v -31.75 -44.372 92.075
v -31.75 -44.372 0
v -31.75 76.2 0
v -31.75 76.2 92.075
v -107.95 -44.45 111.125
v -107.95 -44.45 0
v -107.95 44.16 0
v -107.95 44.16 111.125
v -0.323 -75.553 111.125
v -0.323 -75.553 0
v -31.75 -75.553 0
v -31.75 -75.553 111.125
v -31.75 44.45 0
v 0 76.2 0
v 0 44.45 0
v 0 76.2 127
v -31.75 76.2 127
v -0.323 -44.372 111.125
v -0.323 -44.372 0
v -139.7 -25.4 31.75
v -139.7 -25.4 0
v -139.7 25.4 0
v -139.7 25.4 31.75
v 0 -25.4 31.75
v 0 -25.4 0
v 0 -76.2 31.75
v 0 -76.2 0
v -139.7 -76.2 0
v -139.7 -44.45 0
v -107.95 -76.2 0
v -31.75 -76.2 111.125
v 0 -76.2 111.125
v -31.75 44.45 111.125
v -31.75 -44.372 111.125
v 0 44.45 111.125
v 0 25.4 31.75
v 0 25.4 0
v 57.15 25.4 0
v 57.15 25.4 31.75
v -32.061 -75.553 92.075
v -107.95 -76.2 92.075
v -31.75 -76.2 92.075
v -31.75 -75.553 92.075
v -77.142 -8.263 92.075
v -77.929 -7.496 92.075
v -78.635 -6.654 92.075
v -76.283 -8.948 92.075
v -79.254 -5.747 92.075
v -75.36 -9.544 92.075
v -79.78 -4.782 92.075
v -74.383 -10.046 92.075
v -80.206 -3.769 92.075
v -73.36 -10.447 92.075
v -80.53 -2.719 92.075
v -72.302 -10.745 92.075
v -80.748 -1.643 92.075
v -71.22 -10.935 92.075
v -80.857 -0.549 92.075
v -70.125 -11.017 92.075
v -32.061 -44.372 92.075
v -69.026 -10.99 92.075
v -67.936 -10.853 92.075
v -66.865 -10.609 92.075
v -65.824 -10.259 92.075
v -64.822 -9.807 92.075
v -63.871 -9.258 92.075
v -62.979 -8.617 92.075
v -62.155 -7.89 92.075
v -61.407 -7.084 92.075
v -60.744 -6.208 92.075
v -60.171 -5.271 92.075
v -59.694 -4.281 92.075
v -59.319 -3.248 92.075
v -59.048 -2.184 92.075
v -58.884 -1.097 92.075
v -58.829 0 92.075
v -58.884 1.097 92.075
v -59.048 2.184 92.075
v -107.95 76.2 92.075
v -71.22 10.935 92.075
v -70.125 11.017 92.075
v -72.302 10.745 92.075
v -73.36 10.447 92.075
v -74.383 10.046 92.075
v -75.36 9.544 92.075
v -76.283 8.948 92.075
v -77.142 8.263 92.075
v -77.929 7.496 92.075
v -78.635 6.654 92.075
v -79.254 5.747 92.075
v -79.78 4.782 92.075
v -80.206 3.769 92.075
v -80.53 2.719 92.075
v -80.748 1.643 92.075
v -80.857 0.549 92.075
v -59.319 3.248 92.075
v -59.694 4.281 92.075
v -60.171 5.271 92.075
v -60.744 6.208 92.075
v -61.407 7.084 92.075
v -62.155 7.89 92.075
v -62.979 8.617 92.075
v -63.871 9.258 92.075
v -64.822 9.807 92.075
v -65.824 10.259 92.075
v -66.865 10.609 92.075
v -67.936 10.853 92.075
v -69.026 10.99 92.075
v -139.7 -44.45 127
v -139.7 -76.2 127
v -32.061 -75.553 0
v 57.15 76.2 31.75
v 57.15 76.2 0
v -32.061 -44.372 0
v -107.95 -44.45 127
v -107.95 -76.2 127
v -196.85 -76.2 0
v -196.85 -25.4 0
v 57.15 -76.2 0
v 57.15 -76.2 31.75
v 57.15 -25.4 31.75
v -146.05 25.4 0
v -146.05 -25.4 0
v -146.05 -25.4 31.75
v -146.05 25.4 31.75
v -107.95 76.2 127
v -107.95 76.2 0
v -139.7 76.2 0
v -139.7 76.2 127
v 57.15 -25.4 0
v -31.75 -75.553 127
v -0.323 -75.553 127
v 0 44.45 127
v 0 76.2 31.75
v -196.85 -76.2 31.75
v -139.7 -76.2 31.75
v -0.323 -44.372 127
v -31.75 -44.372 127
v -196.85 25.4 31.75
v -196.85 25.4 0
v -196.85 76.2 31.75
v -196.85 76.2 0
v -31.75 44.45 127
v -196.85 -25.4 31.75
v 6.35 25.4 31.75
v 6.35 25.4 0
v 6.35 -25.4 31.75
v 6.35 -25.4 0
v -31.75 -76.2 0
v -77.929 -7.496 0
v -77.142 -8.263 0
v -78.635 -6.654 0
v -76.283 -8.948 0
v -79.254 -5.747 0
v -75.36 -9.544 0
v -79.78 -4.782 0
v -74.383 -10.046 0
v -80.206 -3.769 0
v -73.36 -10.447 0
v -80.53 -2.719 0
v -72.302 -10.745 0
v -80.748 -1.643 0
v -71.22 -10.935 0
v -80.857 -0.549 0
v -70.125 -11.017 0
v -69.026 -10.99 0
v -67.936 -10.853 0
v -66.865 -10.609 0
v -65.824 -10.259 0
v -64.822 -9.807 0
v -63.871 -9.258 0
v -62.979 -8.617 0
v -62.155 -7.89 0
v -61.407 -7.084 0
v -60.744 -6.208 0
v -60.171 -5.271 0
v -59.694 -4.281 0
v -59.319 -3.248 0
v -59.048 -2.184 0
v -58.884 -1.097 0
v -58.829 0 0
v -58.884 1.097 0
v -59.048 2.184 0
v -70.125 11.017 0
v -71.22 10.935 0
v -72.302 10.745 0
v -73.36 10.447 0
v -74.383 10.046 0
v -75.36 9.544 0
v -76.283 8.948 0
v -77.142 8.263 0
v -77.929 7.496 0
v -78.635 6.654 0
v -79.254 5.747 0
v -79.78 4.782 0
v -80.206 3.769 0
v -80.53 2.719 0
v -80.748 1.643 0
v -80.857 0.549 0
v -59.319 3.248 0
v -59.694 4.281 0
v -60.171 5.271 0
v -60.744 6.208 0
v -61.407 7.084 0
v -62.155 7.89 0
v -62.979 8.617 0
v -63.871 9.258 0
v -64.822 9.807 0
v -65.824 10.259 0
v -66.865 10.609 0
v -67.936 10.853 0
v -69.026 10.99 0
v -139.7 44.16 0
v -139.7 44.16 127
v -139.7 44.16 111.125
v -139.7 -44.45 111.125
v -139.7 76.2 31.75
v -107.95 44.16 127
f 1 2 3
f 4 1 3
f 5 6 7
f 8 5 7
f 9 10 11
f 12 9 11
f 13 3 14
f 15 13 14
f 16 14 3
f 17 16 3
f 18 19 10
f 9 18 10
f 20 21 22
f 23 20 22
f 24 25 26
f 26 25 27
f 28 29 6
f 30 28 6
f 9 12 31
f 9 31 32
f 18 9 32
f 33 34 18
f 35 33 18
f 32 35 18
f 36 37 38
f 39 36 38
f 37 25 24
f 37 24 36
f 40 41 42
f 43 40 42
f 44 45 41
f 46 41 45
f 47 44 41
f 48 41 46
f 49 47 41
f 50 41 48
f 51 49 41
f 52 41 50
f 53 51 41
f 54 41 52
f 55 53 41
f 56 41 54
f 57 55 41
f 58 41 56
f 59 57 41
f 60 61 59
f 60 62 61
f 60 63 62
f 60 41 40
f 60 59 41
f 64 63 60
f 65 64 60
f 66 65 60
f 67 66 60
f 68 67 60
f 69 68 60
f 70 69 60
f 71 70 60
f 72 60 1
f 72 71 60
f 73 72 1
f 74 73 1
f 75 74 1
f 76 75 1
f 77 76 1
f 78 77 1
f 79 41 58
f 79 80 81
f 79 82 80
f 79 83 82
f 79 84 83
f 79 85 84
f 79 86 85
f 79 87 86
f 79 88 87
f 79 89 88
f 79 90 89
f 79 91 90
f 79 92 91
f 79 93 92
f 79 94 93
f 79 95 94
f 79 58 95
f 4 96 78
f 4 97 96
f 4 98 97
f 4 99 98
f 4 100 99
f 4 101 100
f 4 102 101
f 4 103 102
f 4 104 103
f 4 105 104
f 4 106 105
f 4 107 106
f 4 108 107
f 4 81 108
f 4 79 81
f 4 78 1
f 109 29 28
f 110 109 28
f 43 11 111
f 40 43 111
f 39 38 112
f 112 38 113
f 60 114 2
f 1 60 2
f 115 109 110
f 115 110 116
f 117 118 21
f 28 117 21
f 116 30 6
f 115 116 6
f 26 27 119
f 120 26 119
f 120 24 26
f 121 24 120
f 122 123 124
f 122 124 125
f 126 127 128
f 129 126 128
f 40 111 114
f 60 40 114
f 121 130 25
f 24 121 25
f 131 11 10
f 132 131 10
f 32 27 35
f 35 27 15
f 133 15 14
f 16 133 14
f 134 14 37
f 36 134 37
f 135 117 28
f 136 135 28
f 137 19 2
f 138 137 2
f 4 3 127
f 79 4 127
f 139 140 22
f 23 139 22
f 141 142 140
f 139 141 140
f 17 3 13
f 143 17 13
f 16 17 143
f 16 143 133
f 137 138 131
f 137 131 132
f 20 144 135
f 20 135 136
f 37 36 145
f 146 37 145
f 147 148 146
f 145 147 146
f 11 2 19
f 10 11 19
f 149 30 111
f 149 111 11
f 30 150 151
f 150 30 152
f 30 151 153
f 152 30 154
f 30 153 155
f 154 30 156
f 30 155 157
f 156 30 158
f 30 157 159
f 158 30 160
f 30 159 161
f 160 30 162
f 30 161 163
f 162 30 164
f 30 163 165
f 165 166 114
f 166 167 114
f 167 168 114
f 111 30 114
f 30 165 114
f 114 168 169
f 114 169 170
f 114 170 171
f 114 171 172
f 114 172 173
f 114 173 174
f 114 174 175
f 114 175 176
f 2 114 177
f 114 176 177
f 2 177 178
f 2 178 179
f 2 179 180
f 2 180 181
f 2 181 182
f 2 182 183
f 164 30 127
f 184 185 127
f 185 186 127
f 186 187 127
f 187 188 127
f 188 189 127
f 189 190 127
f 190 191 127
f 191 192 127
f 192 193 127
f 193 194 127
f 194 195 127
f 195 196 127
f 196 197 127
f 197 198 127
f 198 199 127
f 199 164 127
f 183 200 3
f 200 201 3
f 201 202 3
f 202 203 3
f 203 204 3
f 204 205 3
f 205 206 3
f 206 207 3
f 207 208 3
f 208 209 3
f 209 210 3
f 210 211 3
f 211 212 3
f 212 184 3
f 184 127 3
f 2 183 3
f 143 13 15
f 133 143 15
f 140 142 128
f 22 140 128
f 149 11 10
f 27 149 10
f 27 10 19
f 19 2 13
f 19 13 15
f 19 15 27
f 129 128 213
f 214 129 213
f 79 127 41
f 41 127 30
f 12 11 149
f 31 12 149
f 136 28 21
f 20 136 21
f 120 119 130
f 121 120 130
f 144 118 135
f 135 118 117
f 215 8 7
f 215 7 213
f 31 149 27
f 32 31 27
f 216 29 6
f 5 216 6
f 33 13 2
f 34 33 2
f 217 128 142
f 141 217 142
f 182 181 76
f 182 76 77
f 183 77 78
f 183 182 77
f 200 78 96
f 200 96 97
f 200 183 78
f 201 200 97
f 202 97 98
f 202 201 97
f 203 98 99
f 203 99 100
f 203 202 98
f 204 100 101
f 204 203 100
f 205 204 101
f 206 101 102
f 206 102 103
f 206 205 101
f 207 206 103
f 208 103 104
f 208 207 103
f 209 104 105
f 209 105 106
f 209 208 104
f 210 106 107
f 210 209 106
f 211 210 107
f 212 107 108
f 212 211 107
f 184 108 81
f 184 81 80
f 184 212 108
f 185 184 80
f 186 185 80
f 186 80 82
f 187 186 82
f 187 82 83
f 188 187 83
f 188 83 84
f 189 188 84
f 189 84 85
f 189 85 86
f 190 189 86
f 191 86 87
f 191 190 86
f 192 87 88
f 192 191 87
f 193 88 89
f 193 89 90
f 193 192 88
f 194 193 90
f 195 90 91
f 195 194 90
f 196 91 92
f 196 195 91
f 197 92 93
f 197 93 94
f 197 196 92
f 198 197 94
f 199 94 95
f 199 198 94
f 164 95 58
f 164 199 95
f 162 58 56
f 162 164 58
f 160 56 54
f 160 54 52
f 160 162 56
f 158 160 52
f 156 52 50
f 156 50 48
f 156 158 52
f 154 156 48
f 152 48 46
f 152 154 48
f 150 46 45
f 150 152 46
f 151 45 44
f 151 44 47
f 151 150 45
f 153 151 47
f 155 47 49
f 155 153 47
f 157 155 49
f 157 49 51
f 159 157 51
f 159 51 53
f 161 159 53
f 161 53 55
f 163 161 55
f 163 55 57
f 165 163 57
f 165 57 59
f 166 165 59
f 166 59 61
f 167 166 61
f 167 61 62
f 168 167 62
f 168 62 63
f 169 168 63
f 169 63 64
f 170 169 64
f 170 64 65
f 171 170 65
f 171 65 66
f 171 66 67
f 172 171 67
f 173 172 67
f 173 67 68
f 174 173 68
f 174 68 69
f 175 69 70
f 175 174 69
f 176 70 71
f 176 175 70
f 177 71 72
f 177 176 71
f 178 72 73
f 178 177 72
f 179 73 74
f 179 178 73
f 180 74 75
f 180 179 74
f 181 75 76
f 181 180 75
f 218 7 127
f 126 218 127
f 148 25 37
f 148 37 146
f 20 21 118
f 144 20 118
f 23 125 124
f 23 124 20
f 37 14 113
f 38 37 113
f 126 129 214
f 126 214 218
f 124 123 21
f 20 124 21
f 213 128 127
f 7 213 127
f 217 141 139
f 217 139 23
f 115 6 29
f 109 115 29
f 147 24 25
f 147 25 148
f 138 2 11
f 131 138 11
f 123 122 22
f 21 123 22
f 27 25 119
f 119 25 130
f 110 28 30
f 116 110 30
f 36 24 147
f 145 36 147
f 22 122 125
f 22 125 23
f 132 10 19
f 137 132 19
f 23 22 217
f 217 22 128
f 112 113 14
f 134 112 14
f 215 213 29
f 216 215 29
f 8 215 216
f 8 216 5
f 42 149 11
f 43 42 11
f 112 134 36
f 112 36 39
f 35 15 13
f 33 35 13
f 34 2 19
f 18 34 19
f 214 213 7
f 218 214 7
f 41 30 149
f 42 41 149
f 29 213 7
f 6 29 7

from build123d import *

# Parameters (mm, degrees)
F1_DEPTH = 127
F2_DEPTH = 111.125
F0_R     = 11.020922
F3_DEPTH = 92.075
F4_DEPTH = 31.75
F0_W     = 6.35
F0_H     = 50.8
F5_DEPTH = 31.75


with BuildPart() as f1:
    # F0 (on Top) → F1 (new body)
    with BuildSketch(Plane.XY):
        Polygon((-107.95, 64.560475), (-107.95, 76.2), (-139.7, 76.2), (-139.7, 64.484443), (-139.7, 44.45), (-139.7, 44.159718), (-107.95, 44.159718), align=None)
        Polygon((0, 76.2), (-31.75, 76.2), (-31.75, 47.939115), (-31.75, 44.45), (0, 44.45), align=None)
        Polygon((-107.95, -51.318158), (-107.95, -44.45), (-139.7, -44.45), (-139.7, -51.39419), (-139.7, -76.2), (-107.95, -76.2), align=None)
        Polygon((-0.322728, -44.372328), (-31.75, -44.372328), (-31.75, -50.97873), (-31.75, -75.553425), (-0.322728, -75.553425), align=None)
    extrude(amount=F1_DEPTH)


with BuildPart() as f2:
    # F0 (on Top) → F2 (new body)
    with BuildSketch(Plane.XY):
        Polygon((-107.95, -44.45), (-107.95, 44.159718), (-139.7, 44.159718), (-139.7, 25.4), (-139.7, -25.4), (-139.7, -44.45), align=None)
        Polygon((0, 44.45), (-31.75, 44.45), (-31.75, -44.372328), (-0.322728, -44.372328), (-0.322728, -75.553425), (-31.75, -75.553425), (-31.75, -76.2), (0, -76.2), (0, -50.902698), (0, -44.45), (0, -25.4), (0, 25.4), (0, 36.746405), align=None)
    extrude(amount=F2_DEPTH)


with BuildPart() as f3:
    # F0 (on Top) → F3 (new body)
    with BuildSketch(Plane.XY):
        Polygon((-31.75, 76.2), (-107.95, 76.2), (-107.95, 64.560475), (-107.95, 44.159718), (-107.95, -44.45), (-107.95, -51.318158), (-107.95, -76.2), (-31.75, -76.2), (-31.75, -75.553425), (-32.060631, -75.553425), (-32.060631, -44.372328), (-31.75, -44.372328), (-31.75, 44.45), (-31.75, 47.939115), align=None)
        with Locations((-69.85, 0)):
            Circle(F0_R, mode=Mode.SUBTRACT)
    extrude(amount=F3_DEPTH)


with BuildPart() as f4:
    # F0 (on Top) → F4 (new body)
    with BuildSketch(Plane.XY):
        Polygon((-139.7, 64.484443), (-139.7, 76.2), (-196.85, 76.2), (-196.85, 25.4), (-146.05, 25.4), (-139.7, 25.4), (-139.7, 44.159718), (-139.7, 44.45), align=None)
        Polygon((-139.7, -51.39419), (-139.7, -44.45), (-139.7, -25.4), (-146.05, -25.4), (-196.85, -25.4), (-196.85, -76.2), (-139.7, -76.2), align=None)
        Polygon((57.15, 76.2), (0, 76.2), (0, 44.45), (0, 36.746405), (0, 25.4), (6.35, 25.4), (57.15, 25.4), align=None)
        Polygon((6.35, -25.4), (0, -25.4), (0, -44.45), (0, -50.902698), (0, -76.2), (57.15, -76.2), (57.15, -25.4), align=None)
    extrude(amount=F4_DEPTH)


with BuildPart() as f5:
    # F0 (on Top) → F5 (new body)
    with BuildSketch(Plane.XY):
        with Locations((-142.875, 0)):
            Rectangle(F0_W, F0_H)
        with Locations((3.175, 0)):
            Rectangle(F0_W, F0_H)
    extrude(amount=F5_DEPTH)


solid = Compound([f1.part, f2.part, f3.part, f4.part, f5.part])
